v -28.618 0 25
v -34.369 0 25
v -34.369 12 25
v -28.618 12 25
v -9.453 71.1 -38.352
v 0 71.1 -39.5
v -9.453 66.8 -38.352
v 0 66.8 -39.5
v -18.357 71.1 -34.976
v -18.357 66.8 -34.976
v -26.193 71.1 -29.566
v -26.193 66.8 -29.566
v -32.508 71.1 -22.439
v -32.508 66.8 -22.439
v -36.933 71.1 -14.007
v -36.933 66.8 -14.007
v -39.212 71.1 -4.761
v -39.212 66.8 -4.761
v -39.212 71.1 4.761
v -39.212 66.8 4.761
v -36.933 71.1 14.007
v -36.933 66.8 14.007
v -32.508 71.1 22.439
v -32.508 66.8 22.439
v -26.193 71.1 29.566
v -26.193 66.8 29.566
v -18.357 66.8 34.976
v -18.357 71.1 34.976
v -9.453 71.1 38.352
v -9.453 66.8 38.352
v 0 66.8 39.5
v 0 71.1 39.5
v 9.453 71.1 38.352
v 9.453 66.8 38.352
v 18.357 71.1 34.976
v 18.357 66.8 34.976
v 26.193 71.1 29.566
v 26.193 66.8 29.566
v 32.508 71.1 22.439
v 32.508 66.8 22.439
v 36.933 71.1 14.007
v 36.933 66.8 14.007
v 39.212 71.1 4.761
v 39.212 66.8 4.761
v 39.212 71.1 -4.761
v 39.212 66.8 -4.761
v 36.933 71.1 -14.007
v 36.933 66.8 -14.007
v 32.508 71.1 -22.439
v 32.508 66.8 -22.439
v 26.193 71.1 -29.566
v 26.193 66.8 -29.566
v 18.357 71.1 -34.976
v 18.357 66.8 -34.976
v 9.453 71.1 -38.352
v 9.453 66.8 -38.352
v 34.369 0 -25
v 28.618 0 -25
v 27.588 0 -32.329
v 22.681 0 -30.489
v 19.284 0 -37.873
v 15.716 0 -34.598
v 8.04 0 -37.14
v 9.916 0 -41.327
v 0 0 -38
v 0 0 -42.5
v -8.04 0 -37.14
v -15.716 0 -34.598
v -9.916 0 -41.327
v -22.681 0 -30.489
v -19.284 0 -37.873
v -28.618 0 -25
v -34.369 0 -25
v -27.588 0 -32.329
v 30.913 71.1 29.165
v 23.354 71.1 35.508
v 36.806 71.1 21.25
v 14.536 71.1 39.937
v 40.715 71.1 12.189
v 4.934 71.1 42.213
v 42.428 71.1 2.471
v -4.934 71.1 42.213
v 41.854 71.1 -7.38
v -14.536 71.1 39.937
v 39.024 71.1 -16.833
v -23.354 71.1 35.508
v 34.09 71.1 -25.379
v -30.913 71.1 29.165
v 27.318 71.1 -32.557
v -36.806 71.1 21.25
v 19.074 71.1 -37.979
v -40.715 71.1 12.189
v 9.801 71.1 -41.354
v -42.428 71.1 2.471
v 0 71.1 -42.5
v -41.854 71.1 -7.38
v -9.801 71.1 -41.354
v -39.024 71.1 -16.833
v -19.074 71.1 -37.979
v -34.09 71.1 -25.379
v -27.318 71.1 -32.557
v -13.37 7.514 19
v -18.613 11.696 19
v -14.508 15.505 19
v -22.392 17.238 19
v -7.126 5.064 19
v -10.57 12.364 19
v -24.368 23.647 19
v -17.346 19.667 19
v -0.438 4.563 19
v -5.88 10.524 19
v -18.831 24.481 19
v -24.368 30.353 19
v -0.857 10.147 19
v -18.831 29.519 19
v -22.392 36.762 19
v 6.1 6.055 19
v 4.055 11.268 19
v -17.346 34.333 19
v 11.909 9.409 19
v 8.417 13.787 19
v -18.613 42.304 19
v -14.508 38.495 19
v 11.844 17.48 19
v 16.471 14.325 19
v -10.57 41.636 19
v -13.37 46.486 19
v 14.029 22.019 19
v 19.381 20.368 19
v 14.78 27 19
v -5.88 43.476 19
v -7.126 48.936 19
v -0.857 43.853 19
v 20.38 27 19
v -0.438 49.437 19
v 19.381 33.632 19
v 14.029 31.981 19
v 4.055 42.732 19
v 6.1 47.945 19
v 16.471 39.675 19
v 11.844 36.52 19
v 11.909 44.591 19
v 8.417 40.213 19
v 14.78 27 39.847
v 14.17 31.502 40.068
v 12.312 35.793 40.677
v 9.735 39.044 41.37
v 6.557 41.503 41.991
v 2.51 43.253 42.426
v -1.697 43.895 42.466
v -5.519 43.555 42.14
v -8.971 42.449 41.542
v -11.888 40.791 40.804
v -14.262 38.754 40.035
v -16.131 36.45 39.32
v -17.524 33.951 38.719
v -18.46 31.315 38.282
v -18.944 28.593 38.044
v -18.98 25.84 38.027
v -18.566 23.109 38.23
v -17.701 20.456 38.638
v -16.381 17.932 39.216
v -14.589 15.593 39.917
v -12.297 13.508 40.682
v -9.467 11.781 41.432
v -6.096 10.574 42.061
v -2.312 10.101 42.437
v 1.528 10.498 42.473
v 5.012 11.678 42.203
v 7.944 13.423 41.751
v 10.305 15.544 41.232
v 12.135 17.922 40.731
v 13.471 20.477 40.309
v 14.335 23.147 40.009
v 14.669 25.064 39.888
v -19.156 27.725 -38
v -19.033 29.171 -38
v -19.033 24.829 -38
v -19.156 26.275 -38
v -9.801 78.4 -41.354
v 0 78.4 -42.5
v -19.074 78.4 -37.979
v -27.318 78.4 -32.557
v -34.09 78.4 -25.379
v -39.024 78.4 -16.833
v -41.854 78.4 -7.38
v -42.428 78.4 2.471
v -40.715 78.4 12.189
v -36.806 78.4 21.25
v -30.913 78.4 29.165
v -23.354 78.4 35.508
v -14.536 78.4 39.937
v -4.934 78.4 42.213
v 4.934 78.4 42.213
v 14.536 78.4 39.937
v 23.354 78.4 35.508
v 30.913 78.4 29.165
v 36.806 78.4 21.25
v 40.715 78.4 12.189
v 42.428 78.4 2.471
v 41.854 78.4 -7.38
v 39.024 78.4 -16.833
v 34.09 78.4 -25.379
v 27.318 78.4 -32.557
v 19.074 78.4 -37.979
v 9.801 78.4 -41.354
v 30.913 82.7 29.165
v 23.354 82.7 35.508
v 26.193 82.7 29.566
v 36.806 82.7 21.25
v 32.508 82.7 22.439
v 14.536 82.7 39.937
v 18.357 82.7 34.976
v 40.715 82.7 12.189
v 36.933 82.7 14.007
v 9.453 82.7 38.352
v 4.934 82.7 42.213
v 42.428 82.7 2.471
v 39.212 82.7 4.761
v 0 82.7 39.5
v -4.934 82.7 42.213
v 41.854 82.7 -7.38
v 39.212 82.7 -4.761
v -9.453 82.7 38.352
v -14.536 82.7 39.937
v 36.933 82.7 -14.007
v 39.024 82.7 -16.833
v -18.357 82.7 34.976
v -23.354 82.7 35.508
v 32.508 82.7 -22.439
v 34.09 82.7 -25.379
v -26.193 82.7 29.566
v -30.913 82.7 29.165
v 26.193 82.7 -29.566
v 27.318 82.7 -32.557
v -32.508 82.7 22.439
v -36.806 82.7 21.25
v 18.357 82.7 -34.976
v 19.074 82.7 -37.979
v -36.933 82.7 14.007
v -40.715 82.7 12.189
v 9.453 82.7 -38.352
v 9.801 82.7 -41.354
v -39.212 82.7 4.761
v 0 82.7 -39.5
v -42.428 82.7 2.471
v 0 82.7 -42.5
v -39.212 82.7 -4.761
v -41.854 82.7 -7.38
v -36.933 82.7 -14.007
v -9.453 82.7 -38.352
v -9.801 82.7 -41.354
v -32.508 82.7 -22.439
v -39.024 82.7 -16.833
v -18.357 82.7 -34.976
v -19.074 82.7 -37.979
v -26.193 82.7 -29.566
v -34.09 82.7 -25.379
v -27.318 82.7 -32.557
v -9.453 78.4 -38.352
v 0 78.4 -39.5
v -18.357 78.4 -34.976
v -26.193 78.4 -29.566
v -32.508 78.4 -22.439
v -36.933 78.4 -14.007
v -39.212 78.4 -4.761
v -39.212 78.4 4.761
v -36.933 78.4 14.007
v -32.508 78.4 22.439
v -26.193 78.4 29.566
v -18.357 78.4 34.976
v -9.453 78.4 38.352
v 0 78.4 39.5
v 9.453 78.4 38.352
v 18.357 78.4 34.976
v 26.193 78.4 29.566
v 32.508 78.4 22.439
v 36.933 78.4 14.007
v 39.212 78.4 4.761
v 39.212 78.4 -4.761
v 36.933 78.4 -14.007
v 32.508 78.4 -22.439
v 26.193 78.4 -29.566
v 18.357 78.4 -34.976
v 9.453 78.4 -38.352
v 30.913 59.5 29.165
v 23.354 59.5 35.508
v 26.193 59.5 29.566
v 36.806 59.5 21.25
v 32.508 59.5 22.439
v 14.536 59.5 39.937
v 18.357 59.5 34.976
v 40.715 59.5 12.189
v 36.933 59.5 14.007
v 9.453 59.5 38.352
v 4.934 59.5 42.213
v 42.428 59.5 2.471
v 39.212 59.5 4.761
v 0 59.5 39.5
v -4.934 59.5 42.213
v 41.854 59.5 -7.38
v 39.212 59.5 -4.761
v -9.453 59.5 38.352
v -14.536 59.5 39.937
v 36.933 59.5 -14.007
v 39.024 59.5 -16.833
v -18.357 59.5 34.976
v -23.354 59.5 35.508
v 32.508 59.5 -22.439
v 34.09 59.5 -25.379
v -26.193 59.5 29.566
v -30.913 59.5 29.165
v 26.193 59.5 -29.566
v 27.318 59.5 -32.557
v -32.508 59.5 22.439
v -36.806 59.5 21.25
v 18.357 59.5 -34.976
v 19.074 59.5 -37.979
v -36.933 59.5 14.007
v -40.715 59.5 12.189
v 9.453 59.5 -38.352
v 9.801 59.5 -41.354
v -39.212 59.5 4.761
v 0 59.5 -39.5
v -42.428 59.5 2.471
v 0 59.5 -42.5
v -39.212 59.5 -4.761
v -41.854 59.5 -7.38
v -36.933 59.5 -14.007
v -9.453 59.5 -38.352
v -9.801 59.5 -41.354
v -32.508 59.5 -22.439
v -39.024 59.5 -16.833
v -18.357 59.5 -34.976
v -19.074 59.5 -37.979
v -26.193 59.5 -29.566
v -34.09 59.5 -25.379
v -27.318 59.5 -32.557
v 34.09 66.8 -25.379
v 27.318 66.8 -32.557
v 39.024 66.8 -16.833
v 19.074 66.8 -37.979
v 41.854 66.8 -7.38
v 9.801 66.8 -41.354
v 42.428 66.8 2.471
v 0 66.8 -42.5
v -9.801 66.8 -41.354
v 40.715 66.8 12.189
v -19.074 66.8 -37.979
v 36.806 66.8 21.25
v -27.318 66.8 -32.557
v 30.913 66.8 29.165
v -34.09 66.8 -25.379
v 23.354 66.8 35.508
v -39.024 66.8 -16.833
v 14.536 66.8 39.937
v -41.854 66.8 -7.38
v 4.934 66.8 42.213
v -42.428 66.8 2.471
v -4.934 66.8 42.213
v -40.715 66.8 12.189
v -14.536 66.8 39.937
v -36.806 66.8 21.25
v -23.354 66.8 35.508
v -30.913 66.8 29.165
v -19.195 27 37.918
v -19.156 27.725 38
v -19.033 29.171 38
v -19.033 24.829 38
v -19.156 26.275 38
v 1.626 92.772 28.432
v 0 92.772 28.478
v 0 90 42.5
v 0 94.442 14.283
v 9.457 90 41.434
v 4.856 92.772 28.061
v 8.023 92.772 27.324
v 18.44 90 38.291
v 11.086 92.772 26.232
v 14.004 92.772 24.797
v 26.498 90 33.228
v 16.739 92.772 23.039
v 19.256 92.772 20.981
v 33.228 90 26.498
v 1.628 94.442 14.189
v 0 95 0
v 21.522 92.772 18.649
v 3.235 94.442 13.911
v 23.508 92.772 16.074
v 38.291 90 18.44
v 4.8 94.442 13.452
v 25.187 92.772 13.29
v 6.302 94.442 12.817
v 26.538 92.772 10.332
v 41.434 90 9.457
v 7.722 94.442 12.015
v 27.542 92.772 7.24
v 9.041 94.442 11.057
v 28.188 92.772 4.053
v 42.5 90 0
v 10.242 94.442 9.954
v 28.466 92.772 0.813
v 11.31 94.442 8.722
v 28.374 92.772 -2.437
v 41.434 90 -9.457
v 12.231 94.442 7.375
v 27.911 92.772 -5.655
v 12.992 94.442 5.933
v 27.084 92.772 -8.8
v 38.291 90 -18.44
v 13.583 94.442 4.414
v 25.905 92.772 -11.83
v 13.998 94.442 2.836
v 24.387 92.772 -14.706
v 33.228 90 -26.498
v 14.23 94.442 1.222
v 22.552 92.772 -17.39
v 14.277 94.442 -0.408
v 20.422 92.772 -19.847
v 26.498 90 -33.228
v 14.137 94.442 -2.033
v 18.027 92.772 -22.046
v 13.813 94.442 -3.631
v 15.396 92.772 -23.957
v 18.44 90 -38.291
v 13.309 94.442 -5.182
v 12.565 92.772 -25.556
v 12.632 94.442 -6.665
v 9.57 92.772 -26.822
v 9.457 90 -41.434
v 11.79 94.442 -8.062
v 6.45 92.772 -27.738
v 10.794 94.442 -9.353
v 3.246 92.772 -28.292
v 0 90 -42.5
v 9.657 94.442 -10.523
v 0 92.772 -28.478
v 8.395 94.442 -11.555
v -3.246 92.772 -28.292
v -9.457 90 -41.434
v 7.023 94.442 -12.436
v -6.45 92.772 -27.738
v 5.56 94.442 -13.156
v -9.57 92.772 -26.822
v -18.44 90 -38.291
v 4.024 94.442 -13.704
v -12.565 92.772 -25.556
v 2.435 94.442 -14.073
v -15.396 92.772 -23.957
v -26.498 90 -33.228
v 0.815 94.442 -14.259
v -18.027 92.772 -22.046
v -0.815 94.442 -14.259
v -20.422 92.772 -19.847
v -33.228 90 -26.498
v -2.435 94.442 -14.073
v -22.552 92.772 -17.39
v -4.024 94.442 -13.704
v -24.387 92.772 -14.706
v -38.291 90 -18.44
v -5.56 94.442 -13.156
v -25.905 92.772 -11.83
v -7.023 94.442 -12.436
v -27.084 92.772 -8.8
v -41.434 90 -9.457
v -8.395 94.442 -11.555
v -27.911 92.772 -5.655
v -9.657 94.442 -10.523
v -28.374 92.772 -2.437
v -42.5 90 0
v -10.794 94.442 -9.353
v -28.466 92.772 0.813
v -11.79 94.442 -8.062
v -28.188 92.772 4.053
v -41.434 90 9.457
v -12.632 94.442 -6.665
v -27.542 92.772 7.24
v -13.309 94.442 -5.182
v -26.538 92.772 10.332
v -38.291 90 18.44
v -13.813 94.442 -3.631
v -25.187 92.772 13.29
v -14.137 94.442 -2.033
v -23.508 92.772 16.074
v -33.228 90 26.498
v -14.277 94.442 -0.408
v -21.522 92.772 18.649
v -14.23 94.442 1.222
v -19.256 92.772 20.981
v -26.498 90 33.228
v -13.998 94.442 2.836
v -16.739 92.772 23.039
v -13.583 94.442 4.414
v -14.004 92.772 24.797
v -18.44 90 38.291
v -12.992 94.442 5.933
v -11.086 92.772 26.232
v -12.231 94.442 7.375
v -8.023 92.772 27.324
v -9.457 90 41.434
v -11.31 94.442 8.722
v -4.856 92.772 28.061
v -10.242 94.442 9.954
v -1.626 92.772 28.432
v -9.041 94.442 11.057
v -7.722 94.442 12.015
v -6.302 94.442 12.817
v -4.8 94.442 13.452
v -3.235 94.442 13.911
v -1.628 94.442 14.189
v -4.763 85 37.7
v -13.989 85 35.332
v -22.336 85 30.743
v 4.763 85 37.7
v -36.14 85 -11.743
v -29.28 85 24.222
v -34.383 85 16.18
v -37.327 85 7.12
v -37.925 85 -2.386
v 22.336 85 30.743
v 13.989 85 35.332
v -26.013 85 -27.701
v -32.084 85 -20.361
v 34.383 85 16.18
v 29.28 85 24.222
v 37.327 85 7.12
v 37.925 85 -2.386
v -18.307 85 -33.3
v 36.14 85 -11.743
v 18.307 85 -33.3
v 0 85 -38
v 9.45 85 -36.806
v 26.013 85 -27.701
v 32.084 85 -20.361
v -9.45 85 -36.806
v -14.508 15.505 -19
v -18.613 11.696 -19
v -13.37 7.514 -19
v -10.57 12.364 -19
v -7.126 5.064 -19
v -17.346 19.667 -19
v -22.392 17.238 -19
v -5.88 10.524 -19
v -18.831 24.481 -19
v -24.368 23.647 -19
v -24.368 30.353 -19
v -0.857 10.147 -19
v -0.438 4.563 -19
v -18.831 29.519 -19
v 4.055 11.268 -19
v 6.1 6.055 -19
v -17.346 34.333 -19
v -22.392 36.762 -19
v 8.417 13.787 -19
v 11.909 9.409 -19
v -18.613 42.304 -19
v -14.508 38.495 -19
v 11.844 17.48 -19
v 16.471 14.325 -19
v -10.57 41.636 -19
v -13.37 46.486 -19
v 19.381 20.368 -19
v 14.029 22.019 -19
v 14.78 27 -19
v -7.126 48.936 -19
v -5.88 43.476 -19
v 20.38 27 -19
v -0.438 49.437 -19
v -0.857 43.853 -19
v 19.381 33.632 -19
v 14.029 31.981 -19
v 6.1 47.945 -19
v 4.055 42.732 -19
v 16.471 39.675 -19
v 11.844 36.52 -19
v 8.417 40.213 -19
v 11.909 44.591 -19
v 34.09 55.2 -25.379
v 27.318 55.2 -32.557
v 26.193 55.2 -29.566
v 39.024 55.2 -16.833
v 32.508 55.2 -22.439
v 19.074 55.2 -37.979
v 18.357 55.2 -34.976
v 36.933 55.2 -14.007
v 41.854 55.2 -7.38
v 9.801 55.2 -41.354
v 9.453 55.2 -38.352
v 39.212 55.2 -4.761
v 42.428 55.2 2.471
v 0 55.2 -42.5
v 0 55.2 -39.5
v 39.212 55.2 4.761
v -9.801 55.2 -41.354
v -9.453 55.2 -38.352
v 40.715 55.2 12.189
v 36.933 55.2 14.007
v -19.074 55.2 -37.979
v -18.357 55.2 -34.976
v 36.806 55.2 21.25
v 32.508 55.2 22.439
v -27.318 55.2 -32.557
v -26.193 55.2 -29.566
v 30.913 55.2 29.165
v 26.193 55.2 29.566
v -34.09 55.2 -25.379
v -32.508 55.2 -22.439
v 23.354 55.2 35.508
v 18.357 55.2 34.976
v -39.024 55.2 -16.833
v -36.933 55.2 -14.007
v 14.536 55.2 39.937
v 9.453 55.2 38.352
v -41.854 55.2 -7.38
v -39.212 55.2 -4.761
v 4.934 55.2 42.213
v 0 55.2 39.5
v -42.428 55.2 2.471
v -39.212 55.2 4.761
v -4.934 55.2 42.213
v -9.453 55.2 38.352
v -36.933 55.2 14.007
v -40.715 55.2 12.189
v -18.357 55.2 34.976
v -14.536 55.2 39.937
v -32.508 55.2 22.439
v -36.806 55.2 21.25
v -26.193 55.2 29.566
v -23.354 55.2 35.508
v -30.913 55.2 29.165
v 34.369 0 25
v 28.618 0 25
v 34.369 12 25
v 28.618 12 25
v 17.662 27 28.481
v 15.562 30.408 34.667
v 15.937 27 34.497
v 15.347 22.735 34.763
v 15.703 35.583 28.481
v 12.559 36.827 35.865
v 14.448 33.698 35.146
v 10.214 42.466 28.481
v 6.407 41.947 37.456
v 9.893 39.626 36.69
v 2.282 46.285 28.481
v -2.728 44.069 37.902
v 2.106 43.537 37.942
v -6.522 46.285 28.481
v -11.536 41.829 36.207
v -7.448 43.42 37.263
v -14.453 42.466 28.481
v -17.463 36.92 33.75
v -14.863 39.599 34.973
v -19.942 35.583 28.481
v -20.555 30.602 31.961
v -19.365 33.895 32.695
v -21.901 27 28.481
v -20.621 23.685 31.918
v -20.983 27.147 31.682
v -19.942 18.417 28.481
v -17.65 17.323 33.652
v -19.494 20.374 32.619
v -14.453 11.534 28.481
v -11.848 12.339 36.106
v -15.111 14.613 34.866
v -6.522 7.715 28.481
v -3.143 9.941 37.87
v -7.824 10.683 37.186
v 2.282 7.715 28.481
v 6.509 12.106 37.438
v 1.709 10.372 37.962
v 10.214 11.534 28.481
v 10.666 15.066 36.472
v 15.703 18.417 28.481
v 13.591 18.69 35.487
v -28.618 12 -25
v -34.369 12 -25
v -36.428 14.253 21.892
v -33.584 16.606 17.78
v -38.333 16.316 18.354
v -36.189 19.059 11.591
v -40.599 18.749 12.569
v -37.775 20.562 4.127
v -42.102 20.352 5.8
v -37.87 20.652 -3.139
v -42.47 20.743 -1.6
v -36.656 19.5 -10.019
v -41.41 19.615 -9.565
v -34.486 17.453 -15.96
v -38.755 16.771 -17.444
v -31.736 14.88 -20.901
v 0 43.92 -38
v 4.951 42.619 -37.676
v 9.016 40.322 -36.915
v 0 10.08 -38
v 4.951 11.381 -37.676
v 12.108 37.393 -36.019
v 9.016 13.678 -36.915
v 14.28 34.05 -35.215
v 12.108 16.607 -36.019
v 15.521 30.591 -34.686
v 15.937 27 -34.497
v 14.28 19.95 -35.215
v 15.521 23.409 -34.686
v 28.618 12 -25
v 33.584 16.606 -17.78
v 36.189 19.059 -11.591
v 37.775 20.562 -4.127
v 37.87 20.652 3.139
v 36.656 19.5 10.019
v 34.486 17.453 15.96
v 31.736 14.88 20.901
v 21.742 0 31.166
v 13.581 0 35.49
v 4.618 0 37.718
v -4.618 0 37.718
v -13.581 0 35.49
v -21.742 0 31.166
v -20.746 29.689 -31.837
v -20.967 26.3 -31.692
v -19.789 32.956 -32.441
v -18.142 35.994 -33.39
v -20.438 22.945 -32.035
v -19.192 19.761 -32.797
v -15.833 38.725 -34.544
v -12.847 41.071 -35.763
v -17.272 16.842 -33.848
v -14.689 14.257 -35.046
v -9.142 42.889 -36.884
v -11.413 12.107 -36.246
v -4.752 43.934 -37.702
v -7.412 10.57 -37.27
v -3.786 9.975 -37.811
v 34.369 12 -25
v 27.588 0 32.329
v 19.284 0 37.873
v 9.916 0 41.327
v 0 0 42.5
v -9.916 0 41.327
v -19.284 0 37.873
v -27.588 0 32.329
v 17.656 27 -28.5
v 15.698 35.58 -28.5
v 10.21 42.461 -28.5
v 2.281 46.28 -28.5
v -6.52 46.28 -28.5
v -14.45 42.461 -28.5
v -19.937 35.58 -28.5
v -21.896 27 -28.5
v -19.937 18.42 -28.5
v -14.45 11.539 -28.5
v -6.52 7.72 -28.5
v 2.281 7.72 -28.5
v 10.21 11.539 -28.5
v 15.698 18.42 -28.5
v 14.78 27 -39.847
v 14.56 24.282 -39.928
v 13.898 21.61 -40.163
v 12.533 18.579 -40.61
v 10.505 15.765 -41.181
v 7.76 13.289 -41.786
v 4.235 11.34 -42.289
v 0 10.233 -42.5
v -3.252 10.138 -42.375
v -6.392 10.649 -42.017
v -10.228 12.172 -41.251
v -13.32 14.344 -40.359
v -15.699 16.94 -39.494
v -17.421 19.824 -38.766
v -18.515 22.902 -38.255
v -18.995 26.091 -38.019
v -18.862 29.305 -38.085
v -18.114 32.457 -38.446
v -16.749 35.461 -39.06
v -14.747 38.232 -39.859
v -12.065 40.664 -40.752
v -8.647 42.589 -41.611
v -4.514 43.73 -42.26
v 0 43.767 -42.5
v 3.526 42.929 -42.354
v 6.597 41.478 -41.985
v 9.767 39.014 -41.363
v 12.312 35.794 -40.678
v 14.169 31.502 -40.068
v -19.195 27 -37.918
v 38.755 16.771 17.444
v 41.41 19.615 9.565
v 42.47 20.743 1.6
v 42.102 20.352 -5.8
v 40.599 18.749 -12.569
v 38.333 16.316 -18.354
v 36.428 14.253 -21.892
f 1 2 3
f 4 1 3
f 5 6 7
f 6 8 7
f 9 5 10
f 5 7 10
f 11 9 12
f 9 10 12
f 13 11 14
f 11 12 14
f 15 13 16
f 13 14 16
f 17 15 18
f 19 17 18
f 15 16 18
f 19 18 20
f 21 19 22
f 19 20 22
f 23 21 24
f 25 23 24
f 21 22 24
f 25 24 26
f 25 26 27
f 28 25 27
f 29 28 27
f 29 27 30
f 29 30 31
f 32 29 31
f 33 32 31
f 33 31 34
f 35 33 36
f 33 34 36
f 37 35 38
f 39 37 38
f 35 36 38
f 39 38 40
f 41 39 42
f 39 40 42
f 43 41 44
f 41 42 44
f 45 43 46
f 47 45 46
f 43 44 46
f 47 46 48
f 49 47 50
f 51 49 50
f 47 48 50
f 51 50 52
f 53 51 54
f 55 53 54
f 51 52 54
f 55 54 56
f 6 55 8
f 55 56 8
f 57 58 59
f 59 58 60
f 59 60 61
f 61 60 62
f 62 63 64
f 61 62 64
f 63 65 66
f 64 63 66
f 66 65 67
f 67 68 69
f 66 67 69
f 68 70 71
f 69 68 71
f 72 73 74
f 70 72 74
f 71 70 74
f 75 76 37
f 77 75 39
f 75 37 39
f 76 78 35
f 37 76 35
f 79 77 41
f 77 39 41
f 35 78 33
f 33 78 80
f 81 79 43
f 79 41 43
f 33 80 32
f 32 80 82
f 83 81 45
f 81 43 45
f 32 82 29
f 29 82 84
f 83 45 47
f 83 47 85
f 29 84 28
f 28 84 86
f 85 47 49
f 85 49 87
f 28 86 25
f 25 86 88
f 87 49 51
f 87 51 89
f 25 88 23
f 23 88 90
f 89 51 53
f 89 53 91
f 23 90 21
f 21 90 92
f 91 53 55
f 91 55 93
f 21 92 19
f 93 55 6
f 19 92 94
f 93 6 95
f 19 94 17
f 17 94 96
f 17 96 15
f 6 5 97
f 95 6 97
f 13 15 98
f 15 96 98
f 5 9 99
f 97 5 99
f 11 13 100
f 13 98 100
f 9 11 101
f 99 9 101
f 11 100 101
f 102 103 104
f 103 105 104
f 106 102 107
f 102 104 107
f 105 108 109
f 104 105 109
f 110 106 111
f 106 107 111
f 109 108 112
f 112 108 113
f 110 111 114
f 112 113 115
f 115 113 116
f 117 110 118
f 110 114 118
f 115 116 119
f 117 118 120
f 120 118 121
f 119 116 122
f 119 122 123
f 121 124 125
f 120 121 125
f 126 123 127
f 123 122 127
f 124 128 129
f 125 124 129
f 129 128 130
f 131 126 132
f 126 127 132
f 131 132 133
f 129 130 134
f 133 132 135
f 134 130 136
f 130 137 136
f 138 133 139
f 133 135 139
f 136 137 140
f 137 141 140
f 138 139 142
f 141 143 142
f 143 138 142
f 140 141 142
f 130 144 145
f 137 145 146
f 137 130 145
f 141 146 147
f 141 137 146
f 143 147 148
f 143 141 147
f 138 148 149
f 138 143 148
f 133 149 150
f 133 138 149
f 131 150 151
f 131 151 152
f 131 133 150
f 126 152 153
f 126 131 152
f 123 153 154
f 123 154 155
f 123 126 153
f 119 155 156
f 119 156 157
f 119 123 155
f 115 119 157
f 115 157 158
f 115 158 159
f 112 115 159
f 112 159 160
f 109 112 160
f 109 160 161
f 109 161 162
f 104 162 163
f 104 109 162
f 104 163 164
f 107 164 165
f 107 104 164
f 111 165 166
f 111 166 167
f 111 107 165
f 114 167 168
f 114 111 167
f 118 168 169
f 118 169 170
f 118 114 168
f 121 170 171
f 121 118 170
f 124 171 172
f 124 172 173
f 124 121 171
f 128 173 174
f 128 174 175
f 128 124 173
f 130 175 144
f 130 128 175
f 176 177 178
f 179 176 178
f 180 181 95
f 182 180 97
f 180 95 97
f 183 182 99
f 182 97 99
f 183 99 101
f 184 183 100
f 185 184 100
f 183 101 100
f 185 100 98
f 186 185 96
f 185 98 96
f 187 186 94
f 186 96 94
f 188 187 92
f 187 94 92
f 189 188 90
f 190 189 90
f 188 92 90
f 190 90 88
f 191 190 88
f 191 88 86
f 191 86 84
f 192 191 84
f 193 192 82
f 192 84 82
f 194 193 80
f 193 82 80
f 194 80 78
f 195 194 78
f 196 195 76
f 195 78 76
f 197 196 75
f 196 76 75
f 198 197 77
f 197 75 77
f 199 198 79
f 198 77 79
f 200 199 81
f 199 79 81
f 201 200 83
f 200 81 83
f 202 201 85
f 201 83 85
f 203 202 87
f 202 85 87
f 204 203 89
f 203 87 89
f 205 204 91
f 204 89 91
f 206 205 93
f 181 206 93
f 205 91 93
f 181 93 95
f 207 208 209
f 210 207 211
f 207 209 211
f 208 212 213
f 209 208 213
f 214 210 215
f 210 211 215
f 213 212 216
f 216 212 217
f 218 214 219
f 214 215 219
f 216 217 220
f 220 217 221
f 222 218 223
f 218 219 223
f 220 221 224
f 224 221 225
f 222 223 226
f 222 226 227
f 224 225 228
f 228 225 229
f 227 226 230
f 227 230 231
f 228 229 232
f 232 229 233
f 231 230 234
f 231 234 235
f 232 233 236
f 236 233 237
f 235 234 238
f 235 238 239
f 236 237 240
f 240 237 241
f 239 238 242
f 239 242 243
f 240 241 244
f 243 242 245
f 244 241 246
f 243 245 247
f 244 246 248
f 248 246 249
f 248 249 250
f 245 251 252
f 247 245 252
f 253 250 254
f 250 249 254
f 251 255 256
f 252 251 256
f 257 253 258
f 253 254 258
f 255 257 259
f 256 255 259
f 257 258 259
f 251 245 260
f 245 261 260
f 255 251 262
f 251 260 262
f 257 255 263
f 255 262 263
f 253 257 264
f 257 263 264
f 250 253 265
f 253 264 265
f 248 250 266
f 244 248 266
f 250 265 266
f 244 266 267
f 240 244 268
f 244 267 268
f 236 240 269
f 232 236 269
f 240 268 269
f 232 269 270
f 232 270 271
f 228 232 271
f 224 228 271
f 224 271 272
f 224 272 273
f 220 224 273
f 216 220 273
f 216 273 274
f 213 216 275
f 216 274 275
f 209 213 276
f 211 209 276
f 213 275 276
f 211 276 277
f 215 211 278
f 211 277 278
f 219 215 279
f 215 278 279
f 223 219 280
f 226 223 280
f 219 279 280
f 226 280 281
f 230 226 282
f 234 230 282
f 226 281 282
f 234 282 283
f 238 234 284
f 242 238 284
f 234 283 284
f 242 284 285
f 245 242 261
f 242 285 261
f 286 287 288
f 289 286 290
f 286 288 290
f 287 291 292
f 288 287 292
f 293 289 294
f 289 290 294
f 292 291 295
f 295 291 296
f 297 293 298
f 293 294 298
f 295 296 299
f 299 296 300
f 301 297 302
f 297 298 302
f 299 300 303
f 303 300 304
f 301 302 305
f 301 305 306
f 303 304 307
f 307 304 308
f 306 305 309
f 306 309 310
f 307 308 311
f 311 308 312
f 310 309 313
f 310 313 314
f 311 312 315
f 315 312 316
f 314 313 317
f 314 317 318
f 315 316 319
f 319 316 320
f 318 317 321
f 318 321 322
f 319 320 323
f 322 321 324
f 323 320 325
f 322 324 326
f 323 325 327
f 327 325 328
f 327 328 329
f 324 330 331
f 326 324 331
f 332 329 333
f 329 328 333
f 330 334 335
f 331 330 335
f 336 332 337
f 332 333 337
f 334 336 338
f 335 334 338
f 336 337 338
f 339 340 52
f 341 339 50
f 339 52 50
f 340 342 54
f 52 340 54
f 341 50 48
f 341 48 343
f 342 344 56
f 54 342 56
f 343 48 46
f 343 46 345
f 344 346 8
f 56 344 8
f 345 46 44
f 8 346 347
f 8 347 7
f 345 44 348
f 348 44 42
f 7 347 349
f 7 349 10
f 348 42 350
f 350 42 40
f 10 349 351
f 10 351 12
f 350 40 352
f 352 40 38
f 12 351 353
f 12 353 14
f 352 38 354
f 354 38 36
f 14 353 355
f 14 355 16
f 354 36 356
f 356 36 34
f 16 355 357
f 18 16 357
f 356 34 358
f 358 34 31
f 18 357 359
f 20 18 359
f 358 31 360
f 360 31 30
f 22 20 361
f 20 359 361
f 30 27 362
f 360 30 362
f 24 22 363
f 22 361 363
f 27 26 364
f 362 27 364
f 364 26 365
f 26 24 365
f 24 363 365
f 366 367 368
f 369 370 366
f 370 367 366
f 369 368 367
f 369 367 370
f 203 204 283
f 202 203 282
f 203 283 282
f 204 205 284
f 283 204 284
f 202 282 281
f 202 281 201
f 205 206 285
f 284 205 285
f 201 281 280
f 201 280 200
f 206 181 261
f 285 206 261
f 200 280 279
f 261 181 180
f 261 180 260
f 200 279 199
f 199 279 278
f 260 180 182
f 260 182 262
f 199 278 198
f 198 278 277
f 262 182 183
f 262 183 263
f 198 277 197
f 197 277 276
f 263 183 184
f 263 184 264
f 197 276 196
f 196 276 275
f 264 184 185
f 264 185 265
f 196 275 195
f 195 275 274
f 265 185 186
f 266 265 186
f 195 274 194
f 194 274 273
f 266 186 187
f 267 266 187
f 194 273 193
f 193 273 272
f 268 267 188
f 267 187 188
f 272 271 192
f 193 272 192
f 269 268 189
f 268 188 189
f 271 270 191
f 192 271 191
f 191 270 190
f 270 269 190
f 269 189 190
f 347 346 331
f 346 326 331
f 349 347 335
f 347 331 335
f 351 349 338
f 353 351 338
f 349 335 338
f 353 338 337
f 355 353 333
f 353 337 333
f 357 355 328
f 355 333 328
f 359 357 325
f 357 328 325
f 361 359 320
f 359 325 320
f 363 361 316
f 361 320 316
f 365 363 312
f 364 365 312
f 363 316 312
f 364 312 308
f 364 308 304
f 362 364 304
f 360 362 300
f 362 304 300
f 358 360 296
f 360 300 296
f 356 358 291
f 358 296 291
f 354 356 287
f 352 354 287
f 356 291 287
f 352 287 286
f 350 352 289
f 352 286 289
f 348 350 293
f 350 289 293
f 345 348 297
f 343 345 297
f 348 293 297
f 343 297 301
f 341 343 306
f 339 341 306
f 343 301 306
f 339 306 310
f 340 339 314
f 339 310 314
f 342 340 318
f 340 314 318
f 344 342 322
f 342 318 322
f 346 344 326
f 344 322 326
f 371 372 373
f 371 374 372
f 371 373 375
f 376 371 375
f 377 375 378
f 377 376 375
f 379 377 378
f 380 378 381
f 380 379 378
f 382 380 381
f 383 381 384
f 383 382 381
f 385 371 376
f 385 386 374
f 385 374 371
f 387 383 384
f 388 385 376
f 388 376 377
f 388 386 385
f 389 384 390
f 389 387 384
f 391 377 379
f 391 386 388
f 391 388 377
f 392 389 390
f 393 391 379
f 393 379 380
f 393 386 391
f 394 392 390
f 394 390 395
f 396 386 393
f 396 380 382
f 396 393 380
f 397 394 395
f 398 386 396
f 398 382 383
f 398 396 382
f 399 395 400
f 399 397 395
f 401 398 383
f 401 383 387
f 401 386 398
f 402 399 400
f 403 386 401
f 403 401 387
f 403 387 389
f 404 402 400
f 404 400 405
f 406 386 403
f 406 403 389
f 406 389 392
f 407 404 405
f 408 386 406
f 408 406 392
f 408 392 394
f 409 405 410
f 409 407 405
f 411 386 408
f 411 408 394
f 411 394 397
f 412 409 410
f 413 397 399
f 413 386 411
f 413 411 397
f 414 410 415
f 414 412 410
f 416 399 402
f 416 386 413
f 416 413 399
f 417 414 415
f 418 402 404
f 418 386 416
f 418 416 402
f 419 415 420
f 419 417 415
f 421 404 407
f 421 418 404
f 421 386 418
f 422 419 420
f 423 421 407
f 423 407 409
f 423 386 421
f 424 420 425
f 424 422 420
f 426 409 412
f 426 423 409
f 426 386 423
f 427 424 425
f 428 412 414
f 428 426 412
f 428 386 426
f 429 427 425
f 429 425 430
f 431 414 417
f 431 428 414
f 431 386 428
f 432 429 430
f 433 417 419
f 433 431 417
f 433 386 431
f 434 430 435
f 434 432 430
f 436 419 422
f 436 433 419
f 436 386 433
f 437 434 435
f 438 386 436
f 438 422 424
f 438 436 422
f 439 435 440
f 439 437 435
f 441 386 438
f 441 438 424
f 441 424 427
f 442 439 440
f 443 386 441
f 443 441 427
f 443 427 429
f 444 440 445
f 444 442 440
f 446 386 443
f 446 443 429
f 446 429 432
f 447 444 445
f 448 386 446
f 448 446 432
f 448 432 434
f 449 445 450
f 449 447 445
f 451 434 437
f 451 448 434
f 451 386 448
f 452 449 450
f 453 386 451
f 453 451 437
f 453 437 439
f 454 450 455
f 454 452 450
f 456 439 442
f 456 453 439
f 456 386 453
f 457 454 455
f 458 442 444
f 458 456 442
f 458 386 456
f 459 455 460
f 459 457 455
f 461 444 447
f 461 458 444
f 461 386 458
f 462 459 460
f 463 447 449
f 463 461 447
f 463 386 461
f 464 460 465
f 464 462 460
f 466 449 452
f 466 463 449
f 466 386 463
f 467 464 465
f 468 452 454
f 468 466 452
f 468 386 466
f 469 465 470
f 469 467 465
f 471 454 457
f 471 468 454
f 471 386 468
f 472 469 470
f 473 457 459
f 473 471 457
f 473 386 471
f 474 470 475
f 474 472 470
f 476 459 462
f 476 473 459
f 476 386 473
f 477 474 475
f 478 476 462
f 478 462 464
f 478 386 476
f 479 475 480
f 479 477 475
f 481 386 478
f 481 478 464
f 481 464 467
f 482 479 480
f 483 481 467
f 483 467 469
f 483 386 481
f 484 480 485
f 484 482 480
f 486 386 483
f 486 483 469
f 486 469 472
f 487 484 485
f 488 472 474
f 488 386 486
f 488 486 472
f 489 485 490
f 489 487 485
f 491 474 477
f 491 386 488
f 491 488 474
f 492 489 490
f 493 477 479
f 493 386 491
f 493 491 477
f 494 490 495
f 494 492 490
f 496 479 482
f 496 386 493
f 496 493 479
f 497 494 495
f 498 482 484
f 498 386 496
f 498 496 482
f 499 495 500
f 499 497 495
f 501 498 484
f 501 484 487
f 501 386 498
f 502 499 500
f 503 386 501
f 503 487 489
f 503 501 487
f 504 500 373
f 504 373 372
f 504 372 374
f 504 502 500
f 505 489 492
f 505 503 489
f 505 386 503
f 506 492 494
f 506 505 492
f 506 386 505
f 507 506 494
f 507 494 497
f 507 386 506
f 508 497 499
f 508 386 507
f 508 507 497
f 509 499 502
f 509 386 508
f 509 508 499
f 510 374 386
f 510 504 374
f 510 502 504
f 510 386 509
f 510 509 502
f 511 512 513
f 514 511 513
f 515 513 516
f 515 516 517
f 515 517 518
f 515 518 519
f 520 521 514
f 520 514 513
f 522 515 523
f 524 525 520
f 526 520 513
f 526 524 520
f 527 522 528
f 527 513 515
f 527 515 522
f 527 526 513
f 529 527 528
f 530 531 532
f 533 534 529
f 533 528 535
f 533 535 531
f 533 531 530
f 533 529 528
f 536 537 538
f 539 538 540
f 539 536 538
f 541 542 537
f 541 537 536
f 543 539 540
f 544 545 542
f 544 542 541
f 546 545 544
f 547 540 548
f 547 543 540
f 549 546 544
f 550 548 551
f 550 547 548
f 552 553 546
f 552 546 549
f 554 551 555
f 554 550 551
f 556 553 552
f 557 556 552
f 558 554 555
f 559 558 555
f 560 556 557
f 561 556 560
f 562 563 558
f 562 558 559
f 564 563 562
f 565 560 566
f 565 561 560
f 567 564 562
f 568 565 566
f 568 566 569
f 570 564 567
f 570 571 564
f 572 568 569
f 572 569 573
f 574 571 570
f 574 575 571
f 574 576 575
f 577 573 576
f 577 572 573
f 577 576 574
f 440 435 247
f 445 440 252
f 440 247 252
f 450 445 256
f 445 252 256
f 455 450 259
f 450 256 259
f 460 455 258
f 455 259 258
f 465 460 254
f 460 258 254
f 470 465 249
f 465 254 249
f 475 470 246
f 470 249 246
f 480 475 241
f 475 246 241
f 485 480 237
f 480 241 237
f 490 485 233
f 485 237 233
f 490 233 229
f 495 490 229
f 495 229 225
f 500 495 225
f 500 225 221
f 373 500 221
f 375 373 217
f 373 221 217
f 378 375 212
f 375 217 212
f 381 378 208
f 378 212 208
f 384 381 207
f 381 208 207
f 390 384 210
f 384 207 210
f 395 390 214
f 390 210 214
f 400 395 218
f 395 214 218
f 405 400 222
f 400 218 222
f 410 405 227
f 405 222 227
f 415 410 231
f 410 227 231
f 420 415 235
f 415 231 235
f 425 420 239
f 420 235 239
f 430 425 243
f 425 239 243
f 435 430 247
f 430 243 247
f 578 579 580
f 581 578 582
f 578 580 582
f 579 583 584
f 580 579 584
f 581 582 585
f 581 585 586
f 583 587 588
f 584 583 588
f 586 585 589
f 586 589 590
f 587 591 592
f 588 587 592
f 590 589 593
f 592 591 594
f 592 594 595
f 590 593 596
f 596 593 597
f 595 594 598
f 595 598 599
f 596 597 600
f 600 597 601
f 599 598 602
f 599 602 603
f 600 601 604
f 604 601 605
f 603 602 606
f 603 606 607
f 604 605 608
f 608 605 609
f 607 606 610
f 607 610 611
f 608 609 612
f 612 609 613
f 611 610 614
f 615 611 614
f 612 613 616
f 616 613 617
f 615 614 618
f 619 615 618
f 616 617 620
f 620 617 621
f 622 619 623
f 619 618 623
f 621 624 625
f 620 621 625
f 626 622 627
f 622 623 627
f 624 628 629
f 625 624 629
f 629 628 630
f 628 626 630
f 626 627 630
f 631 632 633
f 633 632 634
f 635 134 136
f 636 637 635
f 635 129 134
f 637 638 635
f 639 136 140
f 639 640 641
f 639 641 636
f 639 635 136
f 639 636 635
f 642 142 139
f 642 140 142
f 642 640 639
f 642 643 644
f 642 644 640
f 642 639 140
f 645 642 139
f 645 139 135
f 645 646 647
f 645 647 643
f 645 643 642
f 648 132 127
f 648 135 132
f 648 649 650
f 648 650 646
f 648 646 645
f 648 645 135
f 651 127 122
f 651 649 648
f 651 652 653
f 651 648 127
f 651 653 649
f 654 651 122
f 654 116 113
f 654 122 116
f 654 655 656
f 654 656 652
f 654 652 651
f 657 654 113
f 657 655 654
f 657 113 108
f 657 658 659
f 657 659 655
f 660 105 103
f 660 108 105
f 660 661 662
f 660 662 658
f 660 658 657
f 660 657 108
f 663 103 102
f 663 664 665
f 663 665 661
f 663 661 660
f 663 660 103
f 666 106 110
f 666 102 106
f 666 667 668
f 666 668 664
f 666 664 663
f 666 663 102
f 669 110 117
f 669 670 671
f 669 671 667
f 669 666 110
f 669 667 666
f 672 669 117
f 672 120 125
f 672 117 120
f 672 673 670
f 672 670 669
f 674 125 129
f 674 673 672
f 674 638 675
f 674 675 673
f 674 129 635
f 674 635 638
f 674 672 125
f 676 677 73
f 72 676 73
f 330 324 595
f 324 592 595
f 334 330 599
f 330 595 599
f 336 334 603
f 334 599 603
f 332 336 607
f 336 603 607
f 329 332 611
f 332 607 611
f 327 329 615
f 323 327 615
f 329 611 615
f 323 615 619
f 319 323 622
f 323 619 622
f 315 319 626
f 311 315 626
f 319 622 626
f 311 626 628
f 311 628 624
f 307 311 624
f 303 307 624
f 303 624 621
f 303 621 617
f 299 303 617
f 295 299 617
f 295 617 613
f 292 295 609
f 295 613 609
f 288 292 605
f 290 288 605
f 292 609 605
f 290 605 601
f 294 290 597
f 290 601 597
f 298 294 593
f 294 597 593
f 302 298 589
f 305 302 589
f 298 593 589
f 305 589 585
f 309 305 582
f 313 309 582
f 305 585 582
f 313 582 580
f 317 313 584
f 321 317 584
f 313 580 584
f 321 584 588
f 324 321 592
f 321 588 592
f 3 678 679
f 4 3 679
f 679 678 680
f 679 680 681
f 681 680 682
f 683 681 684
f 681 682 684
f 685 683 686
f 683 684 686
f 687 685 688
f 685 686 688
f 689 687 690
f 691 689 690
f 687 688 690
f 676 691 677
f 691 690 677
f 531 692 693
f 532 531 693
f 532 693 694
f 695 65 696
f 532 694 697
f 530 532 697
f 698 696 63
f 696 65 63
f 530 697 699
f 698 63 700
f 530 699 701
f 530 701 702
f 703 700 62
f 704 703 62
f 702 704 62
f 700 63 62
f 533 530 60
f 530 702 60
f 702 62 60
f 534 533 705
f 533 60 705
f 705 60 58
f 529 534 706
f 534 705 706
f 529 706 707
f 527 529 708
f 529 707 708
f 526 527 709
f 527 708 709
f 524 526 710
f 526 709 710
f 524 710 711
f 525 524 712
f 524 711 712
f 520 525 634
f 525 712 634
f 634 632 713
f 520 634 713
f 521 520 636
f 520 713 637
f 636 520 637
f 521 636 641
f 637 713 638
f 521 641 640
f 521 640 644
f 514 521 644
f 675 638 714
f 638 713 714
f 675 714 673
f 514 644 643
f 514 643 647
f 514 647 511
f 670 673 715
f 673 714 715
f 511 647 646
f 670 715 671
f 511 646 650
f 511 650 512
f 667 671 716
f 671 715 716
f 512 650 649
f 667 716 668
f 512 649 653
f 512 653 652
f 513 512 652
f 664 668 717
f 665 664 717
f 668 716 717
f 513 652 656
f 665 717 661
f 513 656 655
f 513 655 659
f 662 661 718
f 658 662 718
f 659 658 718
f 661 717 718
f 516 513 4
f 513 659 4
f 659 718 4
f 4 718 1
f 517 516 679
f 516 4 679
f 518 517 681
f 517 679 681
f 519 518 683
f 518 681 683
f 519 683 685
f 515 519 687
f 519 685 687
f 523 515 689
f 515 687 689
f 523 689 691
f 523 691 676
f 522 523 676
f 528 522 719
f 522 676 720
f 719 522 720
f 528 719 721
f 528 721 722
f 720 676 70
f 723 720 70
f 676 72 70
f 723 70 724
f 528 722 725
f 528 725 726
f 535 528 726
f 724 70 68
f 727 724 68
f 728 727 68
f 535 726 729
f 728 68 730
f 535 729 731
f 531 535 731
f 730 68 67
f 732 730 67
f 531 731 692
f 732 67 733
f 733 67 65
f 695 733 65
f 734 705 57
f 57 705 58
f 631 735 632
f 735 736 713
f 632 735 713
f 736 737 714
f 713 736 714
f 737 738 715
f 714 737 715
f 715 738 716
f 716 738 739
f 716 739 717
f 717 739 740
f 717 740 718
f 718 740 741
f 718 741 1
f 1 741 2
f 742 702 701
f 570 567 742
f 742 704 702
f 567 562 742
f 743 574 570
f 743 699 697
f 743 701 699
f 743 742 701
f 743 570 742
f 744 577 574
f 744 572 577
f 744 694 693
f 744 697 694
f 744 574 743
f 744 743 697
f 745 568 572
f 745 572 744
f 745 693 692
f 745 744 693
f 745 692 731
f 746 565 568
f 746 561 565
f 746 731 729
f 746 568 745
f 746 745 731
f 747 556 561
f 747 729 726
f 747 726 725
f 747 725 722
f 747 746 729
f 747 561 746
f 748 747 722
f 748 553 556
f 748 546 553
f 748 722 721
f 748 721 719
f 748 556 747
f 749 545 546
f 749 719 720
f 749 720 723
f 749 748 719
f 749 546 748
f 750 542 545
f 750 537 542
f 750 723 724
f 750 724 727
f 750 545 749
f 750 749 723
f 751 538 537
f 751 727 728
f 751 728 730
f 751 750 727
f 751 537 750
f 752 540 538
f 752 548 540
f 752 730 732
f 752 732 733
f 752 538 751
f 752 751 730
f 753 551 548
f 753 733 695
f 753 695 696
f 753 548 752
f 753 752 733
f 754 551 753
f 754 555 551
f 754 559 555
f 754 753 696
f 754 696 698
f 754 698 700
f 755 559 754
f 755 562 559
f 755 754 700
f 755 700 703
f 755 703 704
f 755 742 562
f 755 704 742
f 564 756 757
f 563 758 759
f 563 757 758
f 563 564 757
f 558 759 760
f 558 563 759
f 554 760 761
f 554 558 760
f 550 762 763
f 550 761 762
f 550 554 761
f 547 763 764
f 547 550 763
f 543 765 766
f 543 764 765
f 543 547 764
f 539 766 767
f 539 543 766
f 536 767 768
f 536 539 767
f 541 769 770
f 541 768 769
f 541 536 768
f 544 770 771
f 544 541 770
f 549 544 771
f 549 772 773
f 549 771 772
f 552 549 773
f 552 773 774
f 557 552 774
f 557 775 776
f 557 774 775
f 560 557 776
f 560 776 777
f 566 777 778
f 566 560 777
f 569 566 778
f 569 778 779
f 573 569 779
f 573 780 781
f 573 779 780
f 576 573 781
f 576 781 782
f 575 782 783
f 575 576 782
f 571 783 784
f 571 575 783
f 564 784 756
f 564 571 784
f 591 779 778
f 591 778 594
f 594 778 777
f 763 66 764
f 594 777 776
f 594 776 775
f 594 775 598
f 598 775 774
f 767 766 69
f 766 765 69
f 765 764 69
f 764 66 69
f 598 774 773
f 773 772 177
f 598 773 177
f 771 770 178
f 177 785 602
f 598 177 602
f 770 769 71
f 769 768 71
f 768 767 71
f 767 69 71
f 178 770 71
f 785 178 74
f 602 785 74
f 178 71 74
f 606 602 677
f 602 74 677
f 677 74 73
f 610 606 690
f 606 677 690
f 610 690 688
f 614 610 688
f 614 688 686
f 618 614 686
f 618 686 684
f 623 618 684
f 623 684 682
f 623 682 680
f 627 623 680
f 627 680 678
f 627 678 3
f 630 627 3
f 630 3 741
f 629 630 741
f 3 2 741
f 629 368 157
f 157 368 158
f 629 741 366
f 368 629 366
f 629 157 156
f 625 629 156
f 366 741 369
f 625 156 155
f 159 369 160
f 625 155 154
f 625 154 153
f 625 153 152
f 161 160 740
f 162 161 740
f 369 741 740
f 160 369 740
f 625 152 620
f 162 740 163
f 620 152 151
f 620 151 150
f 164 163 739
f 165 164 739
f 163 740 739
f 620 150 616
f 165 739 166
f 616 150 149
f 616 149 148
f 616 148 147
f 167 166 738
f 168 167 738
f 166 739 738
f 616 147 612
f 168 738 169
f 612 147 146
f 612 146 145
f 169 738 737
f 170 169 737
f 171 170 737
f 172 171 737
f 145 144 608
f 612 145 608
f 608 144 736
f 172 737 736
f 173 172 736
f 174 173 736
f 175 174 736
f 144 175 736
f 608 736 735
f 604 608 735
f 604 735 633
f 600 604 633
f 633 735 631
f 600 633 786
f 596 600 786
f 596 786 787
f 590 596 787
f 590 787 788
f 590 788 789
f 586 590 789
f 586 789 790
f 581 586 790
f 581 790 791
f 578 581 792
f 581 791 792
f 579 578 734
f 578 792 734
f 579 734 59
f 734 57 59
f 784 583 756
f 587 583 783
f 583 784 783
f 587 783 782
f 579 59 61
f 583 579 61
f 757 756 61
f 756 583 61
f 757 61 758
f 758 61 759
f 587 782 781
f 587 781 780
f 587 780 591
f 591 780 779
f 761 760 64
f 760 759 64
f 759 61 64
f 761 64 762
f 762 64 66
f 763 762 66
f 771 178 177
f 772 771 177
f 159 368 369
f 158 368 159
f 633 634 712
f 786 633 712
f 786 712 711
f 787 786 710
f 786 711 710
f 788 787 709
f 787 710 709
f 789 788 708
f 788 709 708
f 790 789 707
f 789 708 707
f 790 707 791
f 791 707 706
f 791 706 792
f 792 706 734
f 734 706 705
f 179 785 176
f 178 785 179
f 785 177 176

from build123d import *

# Parameters (mm, degrees)
KUBBE1_FACE_RADIUS          = 42.5
KUBBE1_HEIGHT               = 5
KES_EKSTR_ZYON1_DEPTH       = 113.41663578
KES_EKSTR_ZYON1_DEPTH_BACK  = 113.41663578
IZIM2_R                     = 16.9
IZIM3_R                     = 38
KES_EKSTR_ZYON3_DEPTH       = 85
KES_EKSTR_ZYON4_DEPTH       = 113.416635855
KES_EKSTR_ZYON4_DEPTH_BACK  = 113.416635855
Y_KSEKLIK_EKSTR_ZYON1_START = 19
IZIM5_R                     = 22.5
Y_KSEKLIK_EKSTR_ZYON1_DEPTH = 19
Y_KSEKLIK_EKSTR_ZYON1_TAPER = 16
Y_KSEKLIK_EKSTR_ZYON2_START = -19
IZIM9_R                     = 22.5
Y_KSEKLIK_EKSTR_ZYON2_DEPTH = 19
Y_KSEKLIK_EKSTR_ZYON2_DRAFT = -16
KES_EKSTR_ZYON6_DEPTH       = 132.573173651
KES_EKSTR_ZYON6_DEPTH_BACK  = 132.573173651
IZIM10_R                    = 16.9


with BuildPart() as part:
    # Çizim1 → Döndür1 (revolve)
    with BuildSketch(Plane.XY, mode=Mode.PRIVATE) as d_nd_r1_sk:
        Polygon((0, 0), (0, 90), (42.5, 90), (42.5, 82.7), (39.5, 82.7), (39.5, 78.4), (42.5, 78.4), (42.5, 71.1), (39.5, 71.1), (39.5, 66.8), (42.5, 66.8), (42.5, 59.5), (39.5, 59.5), (39.5, 55.2), (42.5, 55.2), (42.5, 0), align=None)
    revolve(d_nd_r1_sk.sketch.rotate(Axis((0, 0, 0), (0, 1, 0)), 90), axis=Axis((0, 0, 0), (0, 1, 0)))

    # Kubbe1: a dome of height H over a round flat face of radius A is a cap of a sphere of radius (A * A + H * H) / (2 * H)
    kubbe1_r = (KUBBE1_FACE_RADIUS * KUBBE1_FACE_RADIUS + KUBBE1_HEIGHT * KUBBE1_HEIGHT) / (2 * KUBBE1_HEIGHT)
    kubbe1_base = Plane((0, 90, 0), z_dir=(0, 1, 0))
    with Locations(kubbe1_base.offset(KUBBE1_HEIGHT - kubbe1_r)):
        kubbe1_ball = Sphere(kubbe1_r, mode=Mode.PRIVATE)
    add(split(kubbe1_ball, bisect_by=kubbe1_base, keep=Keep.TOP, mode=Mode.PRIVATE))

    # Çizim2 → Kes-Ekstrüzyon1 (cut, two sides: drawn at the far end of the back side and taken through both)
    with BuildSketch(Plane.XY.offset(-KES_EKSTR_ZYON1_DEPTH_BACK)):
        with Locations((-2.119743269, 27)):
            Circle(IZIM2_R)
    extrude(amount=KES_EKSTR_ZYON1_DEPTH + KES_EKSTR_ZYON1_DEPTH_BACK, mode=Mode.SUBTRACT)

    # Çizim3 → Kes-Ekstrüzyon3 (cut)
    with BuildSketch(Plane(origin=(0, 0, 0), x_dir=(-1, 0, 0), z_dir=(0, -1, 0))):
        with Locations(Location((0, 0, 0), (0, 0, 90))):
            Circle(IZIM3_R)
    extrude(amount=-KES_EKSTR_ZYON3_DEPTH, mode=Mode.SUBTRACT)

    # Çizim4 → Kes-Ekstrüzyon4 (cut, two sides: drawn at the far end of the back side and taken through both)
    with BuildSketch(Plane(origin=(0, 0, 0), x_dir=(0, 0, -1), z_dir=(1, 0, 0)).offset(-KES_EKSTR_ZYON4_DEPTH_BACK)):
        with BuildLine():
            Line((-25, 0), (-25, 12))
            ThreePointArc((-25, 12), (0, 20.775010008), (25, 12))
            Line((25, 12), (25, 0))
            Line((25, 0), (-25, 0))
        make_face()
    extrude(amount=KES_EKSTR_ZYON4_DEPTH + KES_EKSTR_ZYON4_DEPTH_BACK, mode=Mode.SUBTRACT)

    # Çizim5 → Yükseklik-Ekstrüzyon1 (add)
    with BuildSketch(Plane.XY.offset(Y_KSEKLIK_EKSTR_ZYON1_START)):
        with Locations((-2.119743269, 27)):
            Circle(IZIM5_R)
    extrude(amount=Y_KSEKLIK_EKSTR_ZYON1_DEPTH, taper=Y_KSEKLIK_EKSTR_ZYON1_TAPER)


with BuildPart() as y_kseklik_ekstr_zyon2_tool:
    # Çizim9 → Yükseklik-Ekstrüzyon2 (with draft: the straight prism first)
    with BuildSketch(Plane.XY.offset(Y_KSEKLIK_EKSTR_ZYON2_START)):
        with Locations((-2.119743269, 27)):
            Circle(IZIM9_R)
    extrude(amount=-Y_KSEKLIK_EKSTR_ZYON2_DEPTH)
    # Yükseklik-Ekstrüzyon2: the draft: its side faces are tilted about the plane it starts from
    y_kseklik_ekstr_zyon2_sides = [y_kseklik_ekstr_zyon2_tool.faces().sort_by_distance(p)[0] for p in [
        (-24.619743269, 27, -28.5),
    ]]
    draft(y_kseklik_ekstr_zyon2_sides, Plane.XY.offset(Y_KSEKLIK_EKSTR_ZYON2_START), Y_KSEKLIK_EKSTR_ZYON2_DRAFT)


with BuildPart() as part_1:
    add(part.part)

    # Yükseklik-Ekstrüzyon2: add y_kseklik_ekstr_zyon2_tool
    add(y_kseklik_ekstr_zyon2_tool.part)

    # Çizim10 → Kes-Ekstrüzyon6 (cut, two sides: drawn at the far end of the back side and taken through both)
    with BuildSketch(Plane(origin=(0, 0, -38), x_dir=(-1, 0, 0), z_dir=(0, 0, -1)).offset(-KES_EKSTR_ZYON6_DEPTH_BACK)):
        with Locations(Location((2.119743269, 27, 0), (0, 0, 180))):
            Circle(IZIM10_R)
    extrude(amount=KES_EKSTR_ZYON6_DEPTH + KES_EKSTR_ZYON6_DEPTH_BACK, mode=Mode.SUBTRACT)


solid = part_1.part
